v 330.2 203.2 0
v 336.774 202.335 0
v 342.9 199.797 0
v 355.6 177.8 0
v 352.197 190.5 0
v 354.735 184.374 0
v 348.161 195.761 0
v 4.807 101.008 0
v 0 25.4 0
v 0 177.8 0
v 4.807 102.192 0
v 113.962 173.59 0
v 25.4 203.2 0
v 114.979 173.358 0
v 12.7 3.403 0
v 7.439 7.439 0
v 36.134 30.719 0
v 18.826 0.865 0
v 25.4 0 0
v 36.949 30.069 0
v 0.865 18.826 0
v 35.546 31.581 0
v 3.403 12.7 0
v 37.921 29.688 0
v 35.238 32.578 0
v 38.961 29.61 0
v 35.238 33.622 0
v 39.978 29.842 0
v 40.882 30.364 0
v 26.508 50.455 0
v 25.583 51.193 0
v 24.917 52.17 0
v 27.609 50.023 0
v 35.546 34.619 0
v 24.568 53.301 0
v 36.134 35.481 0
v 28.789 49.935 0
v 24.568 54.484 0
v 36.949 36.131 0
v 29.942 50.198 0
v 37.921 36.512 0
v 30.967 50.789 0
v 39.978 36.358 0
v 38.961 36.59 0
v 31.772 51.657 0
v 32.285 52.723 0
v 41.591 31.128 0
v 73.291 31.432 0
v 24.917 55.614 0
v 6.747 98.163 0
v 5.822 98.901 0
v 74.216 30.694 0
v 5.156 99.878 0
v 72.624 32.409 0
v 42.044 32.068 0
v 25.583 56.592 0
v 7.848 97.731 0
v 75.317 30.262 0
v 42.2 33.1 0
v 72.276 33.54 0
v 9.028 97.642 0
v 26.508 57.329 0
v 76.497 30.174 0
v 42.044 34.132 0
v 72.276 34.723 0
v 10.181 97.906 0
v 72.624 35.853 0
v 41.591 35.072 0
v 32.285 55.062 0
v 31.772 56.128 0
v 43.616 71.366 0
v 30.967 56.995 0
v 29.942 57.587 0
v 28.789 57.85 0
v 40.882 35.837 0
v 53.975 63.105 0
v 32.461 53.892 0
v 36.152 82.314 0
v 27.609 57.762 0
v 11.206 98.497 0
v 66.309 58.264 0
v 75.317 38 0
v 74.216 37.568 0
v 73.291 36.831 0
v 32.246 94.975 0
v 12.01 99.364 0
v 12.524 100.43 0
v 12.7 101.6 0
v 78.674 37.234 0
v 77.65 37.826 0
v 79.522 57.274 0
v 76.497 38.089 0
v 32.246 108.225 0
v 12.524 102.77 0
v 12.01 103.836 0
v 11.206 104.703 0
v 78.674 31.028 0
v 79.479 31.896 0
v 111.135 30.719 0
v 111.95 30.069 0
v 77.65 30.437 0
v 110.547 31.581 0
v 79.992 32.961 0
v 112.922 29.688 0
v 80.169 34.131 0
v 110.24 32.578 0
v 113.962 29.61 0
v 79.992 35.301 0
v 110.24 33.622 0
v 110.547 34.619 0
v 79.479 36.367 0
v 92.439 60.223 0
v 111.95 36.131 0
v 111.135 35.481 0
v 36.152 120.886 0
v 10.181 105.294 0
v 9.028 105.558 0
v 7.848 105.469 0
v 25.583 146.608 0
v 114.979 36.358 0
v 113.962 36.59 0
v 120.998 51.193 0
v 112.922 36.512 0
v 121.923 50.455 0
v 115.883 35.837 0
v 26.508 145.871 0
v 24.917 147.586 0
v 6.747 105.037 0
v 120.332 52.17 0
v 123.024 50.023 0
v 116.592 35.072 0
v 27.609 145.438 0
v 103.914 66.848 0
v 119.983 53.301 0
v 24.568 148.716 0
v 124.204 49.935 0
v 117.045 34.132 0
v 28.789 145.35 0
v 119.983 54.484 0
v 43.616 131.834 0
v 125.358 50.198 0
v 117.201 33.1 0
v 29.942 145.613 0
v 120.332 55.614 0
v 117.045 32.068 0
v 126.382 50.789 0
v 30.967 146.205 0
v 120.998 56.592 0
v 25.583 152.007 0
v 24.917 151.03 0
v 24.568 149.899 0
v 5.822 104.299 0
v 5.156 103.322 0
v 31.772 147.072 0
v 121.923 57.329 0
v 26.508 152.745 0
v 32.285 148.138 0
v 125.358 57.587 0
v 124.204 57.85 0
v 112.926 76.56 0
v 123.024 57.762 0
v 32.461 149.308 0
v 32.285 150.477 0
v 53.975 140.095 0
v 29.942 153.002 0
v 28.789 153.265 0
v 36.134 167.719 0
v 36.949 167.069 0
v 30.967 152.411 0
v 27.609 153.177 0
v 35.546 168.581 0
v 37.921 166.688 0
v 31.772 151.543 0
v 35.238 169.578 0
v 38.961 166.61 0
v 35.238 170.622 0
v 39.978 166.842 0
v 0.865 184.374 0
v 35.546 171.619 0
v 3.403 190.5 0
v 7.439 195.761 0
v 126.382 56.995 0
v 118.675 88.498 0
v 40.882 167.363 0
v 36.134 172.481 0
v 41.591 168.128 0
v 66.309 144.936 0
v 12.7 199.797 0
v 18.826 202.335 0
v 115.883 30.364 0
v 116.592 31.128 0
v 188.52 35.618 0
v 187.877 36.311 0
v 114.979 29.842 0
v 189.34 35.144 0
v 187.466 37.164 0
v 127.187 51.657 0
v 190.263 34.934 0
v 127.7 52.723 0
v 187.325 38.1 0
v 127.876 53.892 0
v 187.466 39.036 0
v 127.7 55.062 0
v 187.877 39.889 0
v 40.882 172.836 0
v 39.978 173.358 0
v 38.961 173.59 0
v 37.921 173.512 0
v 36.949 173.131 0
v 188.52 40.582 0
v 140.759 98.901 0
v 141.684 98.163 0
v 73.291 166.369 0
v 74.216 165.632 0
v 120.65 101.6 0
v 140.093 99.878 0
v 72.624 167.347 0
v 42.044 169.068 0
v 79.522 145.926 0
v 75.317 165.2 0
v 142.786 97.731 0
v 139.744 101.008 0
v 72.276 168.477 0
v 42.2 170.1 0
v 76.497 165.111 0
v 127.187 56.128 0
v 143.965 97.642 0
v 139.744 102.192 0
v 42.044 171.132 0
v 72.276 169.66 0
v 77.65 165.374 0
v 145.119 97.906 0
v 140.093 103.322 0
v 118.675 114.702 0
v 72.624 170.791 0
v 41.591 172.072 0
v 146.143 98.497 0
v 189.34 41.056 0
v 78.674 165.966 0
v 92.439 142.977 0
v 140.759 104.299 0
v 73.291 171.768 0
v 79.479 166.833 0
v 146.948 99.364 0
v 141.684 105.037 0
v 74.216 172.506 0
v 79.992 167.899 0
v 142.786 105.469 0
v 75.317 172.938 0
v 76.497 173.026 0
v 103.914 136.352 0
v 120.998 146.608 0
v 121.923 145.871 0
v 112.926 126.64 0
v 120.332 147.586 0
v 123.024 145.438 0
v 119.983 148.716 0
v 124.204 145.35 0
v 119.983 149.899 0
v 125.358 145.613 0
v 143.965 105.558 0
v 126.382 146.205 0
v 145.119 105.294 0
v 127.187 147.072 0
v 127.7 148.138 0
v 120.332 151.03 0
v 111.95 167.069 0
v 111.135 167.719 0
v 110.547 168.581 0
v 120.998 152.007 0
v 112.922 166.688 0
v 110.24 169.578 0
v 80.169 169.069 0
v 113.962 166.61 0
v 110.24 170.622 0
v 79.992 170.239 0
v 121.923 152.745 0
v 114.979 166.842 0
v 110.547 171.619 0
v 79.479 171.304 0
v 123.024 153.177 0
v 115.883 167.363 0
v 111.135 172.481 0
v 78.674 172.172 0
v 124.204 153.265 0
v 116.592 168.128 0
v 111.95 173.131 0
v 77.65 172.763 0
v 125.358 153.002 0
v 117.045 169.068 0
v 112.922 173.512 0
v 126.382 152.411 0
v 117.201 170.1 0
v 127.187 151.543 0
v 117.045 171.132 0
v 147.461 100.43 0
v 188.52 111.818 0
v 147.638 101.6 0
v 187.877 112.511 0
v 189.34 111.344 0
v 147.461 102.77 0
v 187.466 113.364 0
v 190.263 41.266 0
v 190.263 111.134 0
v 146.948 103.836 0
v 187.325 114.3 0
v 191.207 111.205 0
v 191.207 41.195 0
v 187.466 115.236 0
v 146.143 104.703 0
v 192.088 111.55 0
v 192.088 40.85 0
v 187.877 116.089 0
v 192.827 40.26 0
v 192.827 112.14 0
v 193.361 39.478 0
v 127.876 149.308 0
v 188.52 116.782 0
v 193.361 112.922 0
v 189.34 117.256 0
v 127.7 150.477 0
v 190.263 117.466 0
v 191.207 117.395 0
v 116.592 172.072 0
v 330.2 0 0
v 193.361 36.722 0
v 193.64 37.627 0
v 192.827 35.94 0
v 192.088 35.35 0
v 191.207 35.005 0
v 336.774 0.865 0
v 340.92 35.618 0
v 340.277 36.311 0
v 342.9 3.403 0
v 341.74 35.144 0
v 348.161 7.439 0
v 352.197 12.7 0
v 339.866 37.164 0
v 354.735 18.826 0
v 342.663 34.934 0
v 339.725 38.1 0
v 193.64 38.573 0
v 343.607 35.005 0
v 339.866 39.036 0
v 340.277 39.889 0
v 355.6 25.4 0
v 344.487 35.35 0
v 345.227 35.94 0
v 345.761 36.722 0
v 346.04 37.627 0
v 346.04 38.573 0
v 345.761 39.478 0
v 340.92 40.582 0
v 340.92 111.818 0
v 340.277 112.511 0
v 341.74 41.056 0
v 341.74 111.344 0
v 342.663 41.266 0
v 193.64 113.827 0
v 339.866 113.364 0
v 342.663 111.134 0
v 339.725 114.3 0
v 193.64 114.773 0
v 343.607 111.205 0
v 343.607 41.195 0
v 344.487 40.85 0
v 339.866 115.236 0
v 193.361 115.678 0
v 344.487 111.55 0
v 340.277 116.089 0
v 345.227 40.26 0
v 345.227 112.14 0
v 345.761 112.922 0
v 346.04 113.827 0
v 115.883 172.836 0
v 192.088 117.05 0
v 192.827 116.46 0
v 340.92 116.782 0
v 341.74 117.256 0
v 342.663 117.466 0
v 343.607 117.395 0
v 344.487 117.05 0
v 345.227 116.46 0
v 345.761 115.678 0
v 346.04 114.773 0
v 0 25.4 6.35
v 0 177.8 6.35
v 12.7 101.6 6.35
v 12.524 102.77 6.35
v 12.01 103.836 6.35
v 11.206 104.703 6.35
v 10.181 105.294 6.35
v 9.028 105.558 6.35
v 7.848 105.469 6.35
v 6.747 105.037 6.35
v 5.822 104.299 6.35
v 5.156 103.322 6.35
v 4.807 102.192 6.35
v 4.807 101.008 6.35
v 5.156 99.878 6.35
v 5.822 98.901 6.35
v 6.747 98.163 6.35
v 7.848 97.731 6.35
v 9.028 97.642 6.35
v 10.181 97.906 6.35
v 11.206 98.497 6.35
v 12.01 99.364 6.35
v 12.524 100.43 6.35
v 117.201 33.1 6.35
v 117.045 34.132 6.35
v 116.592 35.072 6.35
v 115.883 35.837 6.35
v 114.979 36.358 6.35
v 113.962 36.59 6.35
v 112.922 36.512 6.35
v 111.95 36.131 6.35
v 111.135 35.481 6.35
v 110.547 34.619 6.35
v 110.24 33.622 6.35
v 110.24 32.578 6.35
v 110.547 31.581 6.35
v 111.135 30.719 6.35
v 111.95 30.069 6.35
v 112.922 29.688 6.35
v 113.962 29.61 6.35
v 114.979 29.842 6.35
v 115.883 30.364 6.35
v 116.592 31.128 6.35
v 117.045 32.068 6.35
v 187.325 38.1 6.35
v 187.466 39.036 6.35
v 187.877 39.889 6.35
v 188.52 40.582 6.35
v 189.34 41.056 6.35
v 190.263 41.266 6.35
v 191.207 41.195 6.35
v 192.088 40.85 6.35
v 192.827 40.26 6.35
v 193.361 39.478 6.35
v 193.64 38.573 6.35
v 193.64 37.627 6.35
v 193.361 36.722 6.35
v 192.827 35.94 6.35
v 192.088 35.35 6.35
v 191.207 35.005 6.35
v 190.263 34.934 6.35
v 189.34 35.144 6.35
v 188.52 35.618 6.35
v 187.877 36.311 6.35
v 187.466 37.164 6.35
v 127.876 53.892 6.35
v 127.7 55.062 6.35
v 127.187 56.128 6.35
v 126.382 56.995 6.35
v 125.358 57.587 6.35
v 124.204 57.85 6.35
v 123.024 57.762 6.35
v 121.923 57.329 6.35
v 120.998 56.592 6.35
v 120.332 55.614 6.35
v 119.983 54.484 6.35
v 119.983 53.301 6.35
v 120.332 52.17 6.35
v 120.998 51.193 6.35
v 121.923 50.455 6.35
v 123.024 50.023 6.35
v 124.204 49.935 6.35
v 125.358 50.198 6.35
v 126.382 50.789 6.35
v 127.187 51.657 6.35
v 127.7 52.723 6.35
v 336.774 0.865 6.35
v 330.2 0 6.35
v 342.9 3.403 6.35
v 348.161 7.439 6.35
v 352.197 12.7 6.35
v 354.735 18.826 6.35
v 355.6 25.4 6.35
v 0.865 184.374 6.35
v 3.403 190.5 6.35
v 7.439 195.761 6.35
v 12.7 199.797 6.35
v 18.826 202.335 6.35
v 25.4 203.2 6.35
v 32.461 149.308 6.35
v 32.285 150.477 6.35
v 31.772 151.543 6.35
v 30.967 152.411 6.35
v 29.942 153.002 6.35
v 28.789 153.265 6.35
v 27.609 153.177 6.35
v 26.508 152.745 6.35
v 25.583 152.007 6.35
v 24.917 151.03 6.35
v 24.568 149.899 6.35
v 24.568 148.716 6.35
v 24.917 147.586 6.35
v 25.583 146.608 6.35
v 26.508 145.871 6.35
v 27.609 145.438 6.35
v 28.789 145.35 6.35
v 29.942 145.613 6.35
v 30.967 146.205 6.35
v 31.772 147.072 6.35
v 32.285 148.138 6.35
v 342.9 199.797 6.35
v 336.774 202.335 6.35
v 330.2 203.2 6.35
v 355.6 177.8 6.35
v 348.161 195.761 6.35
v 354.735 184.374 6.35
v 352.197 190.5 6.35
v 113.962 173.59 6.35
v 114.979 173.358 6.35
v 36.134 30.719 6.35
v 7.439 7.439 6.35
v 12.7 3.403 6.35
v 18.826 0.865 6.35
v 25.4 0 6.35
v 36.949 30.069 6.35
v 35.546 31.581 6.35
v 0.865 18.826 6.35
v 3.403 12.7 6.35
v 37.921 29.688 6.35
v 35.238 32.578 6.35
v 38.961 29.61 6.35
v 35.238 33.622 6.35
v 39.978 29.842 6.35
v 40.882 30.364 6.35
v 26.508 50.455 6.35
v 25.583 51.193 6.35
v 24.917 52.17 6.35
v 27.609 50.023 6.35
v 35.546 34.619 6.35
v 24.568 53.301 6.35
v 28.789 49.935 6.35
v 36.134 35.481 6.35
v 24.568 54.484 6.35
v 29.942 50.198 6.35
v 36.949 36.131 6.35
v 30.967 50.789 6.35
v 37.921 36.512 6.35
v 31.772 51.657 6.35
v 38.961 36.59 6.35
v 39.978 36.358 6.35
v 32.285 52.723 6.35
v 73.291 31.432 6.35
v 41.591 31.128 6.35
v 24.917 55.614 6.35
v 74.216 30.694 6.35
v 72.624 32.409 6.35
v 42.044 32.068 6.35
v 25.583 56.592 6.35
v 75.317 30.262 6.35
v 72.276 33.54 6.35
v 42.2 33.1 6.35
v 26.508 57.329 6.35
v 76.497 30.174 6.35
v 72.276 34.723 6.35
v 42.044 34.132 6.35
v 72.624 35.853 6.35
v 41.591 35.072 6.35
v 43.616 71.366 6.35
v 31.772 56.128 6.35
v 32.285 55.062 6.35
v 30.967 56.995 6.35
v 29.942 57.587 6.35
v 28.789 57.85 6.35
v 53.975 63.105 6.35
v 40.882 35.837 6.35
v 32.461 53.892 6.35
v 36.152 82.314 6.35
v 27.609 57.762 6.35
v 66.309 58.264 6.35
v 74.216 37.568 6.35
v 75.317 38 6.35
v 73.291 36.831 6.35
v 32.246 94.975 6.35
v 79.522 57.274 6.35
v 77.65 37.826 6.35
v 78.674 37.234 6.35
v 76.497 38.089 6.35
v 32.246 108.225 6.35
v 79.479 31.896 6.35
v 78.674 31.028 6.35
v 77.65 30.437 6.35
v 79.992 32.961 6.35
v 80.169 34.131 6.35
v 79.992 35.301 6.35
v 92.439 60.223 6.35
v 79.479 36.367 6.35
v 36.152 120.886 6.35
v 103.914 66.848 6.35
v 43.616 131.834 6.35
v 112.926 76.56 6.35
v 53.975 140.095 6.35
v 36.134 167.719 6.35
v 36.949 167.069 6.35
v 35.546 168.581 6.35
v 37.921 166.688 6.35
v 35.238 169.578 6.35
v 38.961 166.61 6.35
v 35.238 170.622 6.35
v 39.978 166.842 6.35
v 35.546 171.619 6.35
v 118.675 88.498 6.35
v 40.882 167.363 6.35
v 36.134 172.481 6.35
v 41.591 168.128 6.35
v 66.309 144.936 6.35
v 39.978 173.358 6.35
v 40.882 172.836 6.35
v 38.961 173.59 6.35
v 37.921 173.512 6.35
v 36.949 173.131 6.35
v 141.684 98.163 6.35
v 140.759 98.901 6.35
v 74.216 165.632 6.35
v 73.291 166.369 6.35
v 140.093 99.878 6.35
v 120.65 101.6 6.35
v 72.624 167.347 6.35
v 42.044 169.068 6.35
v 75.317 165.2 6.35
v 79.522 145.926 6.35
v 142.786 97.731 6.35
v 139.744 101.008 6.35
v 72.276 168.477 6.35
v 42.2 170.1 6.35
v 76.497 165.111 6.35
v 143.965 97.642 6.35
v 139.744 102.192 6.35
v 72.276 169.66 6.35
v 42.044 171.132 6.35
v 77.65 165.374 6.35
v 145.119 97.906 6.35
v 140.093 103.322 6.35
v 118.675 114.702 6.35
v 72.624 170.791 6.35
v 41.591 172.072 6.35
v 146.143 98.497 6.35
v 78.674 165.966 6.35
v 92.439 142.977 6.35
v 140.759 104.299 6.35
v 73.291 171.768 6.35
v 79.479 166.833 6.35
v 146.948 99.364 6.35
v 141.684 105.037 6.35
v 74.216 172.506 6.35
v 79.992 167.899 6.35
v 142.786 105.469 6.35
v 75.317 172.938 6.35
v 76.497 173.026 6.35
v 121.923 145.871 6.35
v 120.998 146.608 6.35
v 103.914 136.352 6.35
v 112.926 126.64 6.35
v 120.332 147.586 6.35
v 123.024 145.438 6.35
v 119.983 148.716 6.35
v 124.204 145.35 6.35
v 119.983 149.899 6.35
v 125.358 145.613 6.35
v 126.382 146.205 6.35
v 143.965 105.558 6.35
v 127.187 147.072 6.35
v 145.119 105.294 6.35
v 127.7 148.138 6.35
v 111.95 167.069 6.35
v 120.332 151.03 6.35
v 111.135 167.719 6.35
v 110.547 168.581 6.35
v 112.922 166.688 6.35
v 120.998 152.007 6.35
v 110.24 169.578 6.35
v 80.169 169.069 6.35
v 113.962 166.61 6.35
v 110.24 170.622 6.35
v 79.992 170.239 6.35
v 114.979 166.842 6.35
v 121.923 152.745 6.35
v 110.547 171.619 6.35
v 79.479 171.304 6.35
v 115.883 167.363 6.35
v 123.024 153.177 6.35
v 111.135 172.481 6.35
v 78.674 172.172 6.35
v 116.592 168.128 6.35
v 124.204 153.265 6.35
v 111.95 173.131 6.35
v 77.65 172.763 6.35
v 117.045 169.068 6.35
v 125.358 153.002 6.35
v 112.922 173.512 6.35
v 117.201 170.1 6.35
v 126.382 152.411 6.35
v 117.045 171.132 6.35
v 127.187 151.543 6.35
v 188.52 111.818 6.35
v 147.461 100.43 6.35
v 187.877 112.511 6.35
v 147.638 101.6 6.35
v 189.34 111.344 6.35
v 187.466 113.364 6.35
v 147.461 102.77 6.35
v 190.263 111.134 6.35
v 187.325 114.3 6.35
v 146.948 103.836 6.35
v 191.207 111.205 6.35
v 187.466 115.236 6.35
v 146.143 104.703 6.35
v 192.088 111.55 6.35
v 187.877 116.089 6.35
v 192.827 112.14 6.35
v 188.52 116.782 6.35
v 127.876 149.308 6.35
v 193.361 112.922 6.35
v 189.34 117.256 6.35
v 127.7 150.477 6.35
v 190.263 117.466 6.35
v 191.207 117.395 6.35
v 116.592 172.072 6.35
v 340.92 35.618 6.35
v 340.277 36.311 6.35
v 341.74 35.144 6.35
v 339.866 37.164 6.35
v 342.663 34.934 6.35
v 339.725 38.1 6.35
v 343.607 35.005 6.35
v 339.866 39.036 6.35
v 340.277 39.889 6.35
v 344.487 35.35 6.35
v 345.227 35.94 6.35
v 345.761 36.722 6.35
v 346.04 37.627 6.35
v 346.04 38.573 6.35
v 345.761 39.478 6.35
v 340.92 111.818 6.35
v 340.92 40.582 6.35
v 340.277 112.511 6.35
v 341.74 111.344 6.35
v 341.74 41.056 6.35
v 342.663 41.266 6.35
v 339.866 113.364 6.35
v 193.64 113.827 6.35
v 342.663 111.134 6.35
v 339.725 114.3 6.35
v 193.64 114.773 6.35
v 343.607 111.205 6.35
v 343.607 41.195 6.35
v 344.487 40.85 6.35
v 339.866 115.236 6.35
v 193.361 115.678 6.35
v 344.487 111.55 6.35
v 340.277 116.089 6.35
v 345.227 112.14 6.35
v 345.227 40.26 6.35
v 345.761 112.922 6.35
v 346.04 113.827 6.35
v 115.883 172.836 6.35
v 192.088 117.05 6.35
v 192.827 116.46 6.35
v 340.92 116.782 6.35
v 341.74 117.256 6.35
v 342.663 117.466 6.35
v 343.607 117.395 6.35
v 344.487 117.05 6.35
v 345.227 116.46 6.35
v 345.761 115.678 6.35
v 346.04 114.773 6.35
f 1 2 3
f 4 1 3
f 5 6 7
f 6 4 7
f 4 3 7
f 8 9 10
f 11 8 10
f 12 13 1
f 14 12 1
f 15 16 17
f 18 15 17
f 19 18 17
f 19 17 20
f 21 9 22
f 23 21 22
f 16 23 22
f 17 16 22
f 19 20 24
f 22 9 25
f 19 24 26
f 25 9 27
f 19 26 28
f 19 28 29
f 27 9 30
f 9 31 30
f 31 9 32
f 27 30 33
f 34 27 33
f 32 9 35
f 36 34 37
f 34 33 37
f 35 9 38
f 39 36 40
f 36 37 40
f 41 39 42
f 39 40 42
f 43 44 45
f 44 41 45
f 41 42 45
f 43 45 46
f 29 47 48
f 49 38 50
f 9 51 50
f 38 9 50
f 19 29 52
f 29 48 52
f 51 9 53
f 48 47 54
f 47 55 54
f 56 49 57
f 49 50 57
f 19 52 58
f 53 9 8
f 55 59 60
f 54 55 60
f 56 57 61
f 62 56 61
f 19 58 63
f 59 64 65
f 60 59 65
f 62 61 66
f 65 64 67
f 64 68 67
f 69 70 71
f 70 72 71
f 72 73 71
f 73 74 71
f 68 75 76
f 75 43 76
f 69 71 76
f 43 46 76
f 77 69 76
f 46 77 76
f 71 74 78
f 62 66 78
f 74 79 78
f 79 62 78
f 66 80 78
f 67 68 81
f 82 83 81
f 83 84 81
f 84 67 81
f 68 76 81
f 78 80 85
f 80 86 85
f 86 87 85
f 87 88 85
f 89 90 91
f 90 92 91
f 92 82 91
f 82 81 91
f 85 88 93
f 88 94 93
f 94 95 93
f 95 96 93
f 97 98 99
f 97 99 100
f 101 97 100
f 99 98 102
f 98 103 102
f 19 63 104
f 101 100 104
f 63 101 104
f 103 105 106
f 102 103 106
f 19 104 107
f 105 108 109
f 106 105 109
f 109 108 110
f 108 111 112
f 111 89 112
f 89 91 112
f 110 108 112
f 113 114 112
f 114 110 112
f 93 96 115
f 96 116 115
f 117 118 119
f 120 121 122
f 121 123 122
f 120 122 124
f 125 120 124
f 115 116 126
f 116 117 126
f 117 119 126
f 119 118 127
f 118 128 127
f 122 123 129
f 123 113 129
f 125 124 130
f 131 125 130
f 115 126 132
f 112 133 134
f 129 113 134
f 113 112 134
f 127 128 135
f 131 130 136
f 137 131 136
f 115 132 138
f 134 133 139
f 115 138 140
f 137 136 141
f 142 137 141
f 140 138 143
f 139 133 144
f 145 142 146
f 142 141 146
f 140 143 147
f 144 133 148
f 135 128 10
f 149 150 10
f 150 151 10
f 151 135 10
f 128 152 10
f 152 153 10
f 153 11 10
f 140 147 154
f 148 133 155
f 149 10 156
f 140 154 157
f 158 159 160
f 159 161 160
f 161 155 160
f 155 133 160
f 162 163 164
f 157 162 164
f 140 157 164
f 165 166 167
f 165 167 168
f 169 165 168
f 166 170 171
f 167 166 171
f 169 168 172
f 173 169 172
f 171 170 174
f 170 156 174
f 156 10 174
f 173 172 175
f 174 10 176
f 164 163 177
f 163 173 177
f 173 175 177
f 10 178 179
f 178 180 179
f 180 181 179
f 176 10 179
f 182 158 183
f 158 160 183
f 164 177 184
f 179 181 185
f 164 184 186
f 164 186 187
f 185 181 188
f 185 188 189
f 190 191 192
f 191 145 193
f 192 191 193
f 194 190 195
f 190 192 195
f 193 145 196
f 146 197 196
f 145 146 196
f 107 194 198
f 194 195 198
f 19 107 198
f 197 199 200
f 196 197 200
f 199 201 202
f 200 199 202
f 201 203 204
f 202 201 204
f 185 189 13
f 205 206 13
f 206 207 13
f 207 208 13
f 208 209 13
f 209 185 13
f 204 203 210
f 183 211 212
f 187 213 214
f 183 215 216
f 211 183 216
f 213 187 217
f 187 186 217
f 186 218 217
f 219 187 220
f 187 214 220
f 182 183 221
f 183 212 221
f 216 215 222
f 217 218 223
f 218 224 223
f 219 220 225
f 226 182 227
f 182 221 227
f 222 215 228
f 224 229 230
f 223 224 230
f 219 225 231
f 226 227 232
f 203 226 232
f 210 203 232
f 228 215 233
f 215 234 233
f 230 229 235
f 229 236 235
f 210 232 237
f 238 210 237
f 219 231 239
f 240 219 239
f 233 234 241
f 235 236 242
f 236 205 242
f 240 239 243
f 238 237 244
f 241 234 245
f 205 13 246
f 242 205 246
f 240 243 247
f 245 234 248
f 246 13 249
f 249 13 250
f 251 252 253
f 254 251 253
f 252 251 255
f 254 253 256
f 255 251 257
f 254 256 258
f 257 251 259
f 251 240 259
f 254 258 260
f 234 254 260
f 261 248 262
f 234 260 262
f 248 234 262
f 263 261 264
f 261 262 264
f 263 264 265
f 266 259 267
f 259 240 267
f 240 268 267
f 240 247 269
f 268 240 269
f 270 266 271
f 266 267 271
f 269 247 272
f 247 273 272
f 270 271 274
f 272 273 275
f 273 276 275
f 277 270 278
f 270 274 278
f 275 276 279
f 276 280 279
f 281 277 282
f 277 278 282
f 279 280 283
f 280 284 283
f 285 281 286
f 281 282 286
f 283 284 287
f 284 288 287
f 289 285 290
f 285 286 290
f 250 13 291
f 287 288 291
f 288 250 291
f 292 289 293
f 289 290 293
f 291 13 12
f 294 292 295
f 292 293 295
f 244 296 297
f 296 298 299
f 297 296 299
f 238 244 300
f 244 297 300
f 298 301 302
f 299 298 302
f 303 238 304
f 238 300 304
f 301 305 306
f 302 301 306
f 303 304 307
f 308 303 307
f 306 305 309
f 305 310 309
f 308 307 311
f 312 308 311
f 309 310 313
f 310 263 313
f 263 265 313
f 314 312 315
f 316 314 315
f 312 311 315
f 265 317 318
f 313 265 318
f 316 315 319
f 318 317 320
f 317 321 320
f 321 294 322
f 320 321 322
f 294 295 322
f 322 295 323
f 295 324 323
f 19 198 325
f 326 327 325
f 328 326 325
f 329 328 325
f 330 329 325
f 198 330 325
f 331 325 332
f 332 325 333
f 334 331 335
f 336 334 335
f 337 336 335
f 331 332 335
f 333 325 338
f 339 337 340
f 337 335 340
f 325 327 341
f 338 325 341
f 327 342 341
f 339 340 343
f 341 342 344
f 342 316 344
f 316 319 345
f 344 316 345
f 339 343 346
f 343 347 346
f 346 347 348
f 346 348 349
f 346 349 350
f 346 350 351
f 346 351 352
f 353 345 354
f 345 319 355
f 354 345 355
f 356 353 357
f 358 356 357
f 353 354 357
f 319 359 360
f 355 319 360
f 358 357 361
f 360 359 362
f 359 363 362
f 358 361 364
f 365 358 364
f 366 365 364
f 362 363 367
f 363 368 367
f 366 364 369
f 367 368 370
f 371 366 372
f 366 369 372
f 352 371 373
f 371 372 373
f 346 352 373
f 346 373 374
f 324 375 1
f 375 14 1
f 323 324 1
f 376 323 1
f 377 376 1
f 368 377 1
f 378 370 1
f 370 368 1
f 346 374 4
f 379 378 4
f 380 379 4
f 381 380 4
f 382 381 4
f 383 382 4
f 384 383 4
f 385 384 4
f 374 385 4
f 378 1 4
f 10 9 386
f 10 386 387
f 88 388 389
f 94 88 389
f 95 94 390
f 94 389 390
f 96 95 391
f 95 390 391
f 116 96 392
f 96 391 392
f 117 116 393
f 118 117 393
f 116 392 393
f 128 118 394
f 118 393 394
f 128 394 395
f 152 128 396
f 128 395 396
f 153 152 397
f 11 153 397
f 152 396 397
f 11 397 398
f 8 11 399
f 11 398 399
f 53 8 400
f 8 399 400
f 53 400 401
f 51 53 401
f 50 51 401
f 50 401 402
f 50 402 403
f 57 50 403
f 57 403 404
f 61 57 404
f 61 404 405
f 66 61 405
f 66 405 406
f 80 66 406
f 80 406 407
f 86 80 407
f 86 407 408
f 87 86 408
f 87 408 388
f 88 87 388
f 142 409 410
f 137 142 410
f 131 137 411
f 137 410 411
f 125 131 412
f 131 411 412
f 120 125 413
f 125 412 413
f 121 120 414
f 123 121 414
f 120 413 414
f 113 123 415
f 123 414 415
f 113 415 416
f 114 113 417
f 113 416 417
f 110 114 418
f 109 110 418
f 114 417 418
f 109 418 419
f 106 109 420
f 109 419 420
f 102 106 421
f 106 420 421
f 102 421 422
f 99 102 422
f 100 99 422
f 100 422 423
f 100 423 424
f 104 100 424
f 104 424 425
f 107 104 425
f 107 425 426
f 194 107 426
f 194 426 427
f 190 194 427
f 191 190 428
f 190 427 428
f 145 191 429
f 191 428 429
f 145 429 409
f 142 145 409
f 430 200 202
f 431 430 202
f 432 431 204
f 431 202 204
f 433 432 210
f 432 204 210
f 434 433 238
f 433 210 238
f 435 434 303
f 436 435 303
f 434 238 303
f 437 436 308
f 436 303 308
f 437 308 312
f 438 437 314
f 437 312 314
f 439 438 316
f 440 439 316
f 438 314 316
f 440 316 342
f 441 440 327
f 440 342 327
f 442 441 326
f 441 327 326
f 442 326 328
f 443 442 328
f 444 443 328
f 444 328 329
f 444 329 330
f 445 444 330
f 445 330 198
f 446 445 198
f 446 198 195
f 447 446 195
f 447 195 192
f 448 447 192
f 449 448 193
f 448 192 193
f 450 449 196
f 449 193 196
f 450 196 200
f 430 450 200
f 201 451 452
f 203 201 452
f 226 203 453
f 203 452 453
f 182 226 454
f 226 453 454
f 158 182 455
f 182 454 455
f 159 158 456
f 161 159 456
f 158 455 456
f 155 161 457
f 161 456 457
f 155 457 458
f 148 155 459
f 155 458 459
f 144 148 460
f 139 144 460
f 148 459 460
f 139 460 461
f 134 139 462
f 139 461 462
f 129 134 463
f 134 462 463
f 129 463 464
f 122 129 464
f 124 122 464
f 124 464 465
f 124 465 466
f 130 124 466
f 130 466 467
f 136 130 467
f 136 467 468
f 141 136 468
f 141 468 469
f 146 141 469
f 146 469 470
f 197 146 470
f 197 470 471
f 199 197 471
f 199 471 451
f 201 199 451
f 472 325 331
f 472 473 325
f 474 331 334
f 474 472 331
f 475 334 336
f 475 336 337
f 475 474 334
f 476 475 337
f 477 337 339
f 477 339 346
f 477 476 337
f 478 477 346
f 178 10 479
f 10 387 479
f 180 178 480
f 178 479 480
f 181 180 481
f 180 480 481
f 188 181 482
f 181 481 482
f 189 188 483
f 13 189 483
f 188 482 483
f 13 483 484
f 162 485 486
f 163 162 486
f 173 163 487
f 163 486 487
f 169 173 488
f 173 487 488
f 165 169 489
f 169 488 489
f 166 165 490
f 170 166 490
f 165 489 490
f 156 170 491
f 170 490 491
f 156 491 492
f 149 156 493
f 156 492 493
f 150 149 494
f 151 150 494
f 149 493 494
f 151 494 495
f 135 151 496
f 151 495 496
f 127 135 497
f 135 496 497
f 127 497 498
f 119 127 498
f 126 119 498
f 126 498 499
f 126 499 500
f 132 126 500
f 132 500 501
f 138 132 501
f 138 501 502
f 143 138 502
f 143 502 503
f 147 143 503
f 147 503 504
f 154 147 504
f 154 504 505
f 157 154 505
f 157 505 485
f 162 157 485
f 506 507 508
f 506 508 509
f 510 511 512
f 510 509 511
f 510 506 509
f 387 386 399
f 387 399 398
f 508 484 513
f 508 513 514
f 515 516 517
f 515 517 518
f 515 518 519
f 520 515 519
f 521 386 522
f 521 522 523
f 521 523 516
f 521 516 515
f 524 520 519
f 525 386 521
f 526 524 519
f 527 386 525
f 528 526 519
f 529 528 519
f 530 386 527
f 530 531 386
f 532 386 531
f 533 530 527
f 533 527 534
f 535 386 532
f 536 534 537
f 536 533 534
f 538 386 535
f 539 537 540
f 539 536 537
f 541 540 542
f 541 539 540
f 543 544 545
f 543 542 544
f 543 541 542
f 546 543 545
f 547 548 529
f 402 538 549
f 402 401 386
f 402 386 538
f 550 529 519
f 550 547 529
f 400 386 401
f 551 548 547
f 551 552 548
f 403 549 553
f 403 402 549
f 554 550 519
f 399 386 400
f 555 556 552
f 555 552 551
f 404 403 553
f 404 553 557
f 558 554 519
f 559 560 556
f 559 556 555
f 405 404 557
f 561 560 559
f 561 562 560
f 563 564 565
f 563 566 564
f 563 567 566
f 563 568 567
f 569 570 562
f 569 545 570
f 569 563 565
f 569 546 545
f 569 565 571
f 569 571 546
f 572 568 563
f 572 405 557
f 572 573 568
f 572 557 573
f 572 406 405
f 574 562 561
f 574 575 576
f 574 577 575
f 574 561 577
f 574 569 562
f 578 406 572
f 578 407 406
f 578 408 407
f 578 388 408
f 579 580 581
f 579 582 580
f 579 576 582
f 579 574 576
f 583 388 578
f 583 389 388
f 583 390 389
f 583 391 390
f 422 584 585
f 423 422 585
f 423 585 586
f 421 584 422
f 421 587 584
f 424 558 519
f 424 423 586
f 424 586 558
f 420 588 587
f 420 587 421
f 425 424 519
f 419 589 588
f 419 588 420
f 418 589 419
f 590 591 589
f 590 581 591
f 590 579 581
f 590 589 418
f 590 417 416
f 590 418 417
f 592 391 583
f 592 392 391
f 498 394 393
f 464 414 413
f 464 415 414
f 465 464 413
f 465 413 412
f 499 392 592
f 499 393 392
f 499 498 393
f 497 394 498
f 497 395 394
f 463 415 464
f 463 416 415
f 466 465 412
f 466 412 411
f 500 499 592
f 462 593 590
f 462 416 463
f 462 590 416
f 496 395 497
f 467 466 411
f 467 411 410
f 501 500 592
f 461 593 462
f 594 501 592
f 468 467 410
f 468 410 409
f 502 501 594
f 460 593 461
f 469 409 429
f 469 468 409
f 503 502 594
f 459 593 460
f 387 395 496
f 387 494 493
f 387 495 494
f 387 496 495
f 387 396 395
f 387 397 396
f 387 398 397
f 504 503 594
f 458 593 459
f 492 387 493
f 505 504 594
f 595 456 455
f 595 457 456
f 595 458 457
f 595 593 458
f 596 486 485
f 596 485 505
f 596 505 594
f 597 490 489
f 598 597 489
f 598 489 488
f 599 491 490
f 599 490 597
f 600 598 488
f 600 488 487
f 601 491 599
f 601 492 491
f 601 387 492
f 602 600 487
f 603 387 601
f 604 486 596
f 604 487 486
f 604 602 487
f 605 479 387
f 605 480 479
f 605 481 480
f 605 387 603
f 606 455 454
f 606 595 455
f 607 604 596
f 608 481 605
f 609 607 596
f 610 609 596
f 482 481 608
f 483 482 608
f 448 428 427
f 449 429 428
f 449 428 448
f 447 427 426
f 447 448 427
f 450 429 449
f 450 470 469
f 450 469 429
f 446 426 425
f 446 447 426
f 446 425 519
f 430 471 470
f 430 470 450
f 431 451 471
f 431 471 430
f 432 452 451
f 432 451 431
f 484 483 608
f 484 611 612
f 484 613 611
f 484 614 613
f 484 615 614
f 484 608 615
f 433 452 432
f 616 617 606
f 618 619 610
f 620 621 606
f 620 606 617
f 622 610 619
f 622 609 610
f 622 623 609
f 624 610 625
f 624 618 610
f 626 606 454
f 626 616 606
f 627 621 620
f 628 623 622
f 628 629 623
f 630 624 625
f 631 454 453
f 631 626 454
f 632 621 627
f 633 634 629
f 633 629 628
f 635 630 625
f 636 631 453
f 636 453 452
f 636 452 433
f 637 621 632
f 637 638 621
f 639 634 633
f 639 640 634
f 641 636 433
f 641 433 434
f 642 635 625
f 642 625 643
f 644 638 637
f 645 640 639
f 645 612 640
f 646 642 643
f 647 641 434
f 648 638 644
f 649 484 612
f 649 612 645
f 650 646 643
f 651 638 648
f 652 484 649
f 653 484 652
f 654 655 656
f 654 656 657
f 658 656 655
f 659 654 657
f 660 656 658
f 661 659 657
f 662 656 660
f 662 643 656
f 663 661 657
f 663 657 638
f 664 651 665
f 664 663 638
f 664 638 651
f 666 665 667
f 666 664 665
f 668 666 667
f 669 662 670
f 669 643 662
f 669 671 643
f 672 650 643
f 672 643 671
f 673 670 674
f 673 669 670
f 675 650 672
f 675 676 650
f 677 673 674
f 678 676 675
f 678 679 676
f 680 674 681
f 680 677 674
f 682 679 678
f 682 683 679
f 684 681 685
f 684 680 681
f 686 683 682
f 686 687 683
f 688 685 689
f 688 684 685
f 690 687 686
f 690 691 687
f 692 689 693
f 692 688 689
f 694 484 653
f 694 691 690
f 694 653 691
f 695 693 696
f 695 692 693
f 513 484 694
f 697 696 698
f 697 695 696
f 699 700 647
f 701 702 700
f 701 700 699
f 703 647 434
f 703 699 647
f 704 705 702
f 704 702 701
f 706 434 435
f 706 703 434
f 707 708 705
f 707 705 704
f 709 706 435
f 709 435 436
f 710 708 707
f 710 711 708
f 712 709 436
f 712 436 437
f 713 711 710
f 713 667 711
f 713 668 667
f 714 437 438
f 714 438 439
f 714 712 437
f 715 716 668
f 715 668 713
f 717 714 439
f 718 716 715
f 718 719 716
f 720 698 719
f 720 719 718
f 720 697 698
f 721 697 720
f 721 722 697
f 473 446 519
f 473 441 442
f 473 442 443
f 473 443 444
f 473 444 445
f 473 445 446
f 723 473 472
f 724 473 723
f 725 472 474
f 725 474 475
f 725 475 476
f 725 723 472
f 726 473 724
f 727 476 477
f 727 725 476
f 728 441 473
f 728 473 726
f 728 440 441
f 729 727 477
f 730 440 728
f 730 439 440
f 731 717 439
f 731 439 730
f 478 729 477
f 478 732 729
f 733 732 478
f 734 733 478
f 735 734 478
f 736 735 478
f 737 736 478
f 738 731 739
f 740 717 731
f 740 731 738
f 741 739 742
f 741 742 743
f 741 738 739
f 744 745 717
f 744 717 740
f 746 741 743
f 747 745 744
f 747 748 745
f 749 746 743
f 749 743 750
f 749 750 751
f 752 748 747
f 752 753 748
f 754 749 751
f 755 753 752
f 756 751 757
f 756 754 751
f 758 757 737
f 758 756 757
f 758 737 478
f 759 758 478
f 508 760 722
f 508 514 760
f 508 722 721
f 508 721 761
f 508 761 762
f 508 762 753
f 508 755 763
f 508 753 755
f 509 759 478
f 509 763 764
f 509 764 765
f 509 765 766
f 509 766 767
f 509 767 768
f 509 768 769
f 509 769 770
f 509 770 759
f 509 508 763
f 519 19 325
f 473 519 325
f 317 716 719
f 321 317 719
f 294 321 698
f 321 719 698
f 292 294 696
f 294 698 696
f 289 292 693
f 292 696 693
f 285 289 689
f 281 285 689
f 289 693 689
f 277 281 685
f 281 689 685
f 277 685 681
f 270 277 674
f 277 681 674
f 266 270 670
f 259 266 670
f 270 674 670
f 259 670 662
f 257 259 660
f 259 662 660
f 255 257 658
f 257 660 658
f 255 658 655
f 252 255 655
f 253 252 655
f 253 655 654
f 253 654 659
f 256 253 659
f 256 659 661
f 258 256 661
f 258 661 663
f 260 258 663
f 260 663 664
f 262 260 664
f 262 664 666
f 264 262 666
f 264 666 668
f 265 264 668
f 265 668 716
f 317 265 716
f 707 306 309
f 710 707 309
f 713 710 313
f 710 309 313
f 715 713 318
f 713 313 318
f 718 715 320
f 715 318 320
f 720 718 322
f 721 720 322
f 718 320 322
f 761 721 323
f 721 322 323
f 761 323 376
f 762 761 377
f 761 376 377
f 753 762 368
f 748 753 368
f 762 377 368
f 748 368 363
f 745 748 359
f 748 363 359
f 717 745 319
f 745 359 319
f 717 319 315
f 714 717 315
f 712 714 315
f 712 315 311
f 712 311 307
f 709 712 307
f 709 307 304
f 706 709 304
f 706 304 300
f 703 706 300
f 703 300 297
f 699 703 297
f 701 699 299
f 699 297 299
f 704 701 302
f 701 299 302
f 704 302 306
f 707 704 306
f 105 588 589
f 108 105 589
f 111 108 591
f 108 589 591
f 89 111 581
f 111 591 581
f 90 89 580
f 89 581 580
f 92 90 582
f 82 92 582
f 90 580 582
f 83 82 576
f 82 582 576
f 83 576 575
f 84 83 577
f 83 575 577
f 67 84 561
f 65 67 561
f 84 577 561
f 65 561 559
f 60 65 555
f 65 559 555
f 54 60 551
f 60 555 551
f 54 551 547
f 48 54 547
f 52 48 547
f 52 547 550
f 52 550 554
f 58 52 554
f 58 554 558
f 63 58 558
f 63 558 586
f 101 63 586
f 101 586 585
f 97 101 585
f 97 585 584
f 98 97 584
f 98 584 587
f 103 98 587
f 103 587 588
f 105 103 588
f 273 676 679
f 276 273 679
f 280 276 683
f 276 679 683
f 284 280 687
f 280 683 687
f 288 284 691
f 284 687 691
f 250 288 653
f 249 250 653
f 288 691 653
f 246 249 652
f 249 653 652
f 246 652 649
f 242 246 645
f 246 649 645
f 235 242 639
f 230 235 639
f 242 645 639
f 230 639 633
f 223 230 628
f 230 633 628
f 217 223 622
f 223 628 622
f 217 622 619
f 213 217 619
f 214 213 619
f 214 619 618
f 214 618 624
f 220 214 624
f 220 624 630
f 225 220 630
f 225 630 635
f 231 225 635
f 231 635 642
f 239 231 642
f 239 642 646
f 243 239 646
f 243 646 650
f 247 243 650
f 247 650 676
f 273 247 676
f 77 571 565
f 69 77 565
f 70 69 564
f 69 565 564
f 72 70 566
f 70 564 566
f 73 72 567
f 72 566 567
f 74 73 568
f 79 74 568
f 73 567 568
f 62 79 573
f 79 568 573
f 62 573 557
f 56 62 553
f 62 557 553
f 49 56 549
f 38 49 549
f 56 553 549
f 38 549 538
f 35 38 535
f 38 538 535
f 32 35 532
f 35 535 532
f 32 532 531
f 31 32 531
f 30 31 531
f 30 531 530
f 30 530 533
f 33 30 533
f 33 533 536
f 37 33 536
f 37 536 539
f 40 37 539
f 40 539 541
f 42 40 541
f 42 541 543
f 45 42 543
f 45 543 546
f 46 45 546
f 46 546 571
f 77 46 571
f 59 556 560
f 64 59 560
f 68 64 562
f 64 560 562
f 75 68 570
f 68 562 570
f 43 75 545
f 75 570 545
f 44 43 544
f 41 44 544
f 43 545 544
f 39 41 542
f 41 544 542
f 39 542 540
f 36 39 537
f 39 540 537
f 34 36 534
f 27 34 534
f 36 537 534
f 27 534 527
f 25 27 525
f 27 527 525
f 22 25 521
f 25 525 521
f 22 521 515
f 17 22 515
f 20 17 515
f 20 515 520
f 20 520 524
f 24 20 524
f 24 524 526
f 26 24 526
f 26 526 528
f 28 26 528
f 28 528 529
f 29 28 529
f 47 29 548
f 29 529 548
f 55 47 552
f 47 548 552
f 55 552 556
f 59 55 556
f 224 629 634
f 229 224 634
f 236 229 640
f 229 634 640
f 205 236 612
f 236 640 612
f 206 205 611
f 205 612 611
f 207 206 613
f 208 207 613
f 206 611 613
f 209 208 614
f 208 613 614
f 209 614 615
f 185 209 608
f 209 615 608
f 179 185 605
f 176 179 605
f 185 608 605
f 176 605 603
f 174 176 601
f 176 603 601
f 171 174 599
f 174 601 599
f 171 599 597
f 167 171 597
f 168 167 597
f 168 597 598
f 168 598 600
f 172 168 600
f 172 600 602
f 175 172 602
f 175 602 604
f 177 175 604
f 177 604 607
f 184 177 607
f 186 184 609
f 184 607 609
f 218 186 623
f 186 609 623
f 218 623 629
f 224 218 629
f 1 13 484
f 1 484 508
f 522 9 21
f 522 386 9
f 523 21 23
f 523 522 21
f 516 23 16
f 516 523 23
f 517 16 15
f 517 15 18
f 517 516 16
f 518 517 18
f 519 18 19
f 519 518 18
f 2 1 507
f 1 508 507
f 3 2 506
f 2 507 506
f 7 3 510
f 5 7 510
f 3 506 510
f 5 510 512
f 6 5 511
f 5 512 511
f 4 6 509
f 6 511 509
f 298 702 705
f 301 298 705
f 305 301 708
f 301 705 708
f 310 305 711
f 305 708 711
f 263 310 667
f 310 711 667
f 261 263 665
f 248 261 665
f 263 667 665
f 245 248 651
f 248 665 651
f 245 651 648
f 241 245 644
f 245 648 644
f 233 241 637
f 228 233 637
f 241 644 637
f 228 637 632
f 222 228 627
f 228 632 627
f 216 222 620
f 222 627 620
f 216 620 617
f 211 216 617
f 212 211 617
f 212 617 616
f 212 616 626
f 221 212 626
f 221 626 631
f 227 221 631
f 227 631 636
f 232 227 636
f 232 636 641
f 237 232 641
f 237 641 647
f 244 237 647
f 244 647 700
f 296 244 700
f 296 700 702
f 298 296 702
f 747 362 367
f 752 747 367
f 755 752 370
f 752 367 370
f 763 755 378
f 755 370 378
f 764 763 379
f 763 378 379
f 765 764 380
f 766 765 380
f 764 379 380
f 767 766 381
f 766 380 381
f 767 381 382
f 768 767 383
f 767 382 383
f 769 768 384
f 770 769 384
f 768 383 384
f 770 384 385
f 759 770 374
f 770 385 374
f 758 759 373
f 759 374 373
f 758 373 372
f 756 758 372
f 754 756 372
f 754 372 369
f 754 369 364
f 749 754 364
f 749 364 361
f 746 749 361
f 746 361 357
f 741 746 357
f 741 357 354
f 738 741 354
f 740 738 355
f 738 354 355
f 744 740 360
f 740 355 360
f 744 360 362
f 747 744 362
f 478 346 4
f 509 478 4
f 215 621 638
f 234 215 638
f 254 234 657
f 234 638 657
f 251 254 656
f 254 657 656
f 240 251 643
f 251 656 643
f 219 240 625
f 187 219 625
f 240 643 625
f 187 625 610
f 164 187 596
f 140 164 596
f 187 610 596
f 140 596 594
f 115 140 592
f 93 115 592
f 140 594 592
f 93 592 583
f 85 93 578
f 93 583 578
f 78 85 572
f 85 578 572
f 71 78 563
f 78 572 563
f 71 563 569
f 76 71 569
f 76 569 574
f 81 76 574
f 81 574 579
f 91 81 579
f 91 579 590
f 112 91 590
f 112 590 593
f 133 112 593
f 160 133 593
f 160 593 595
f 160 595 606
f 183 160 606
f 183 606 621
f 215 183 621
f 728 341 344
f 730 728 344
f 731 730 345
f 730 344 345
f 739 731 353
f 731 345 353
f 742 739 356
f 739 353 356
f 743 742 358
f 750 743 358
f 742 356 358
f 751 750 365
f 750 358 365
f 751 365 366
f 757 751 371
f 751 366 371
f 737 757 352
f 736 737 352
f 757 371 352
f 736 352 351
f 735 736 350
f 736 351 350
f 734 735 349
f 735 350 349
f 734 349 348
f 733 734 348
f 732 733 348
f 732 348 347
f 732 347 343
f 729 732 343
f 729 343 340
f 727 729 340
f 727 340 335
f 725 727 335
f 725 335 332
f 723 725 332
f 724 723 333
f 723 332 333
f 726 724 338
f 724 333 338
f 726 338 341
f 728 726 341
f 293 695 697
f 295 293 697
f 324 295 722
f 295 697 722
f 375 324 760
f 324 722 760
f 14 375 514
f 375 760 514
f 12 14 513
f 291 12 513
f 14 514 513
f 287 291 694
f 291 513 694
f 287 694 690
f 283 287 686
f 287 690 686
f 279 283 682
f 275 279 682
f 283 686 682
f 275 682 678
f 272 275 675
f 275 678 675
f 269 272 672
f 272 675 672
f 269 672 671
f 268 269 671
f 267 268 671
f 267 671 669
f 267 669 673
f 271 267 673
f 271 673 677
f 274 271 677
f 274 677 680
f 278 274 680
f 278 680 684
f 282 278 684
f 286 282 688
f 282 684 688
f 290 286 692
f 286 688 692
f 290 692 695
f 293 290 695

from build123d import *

# Parameters (mm, degrees)
SKETCH1_W           = 355.6
SKETCH1_H           = 203.2
BOSS_EXTRUDE1_DEPTH = 6.35
SKETCH2_R           = 44.45
SKETCH2_R_2         = 3.96875
CUT_EXTRUDE1_DEPTH  = 76.2
SKETCH3_R           = 3.50012
CUT_EXTRUDE2_DEPTH  = 6.35
FILLET1_R           = 25.4
SKETCH5_R           = 3.175
CUT_EXTRUDE4_DEPTH  = 6.35


with BuildPart() as part:
    # Sketch1 → Boss-Extrude1 (new body)
    with BuildSketch(Plane.XY):
        with Locations((177.8, 101.6)):
            Rectangle(SKETCH1_W, SKETCH1_H)
    extrude(amount=BOSS_EXTRUDE1_DEPTH)

    # Sketch2 → Cut-Extrude1 (cut)
    with BuildSketch(Plane.XY.offset(6.35)):
        with Locations((76.2, 101.6)):
            Circle(SKETCH2_R)
        with Locations((143.66875, 101.6)):
            Circle(SKETCH2_R_2)
        with Locations((123.907610643, 53.892389357)):
            Circle(SKETCH2_R_2)
        with Locations((76.2, 34.13125)):
            Circle(SKETCH2_R_2)
        with Locations((28.492389357, 53.892389357)):
            Circle(SKETCH2_R_2)
        with Locations((8.73125, 101.6)):
            Circle(SKETCH2_R_2)
        with Locations((28.492389357, 149.307610643)):
            Circle(SKETCH2_R_2)
        with Locations((76.2, 169.06875)):
            Circle(SKETCH2_R_2)
        with Locations((123.907610643, 149.307610643)):
            Circle(SKETCH2_R_2)
    extrude(amount=-CUT_EXTRUDE1_DEPTH, mode=Mode.SUBTRACT)

    # Sketch3 → Cut-Extrude2 (cut)
    with BuildSketch(Plane.XY.offset(6.35)):
        with Locations((38.69944, 170.09999)):
            Circle(SKETCH3_R)
        with Locations((113.70056, 170.09999)):
            Circle(SKETCH3_R)
        with Locations((113.70056, 33.10001)):
            Circle(SKETCH3_R)
        with Locations((38.69944, 33.10001)):
            Circle(SKETCH3_R)
    extrude(amount=-CUT_EXTRUDE2_DEPTH, mode=Mode.SUBTRACT)

    # Fillet1
    fillet1_edges = [part.edges().sort_by_distance(p)[0] for p in [
        (0, 203.2, 3.175),
        (355.6, 203.2, 3.175),
        (355.6, 0, 3.175),
        (0, 0, 3.175),
    ]]
    fillet(fillet1_edges, radius=FILLET1_R)

    # Sketch5 → Cut-Extrude4 (cut)
    with BuildSketch(Plane(origin=(0, 0, 0), x_dir=(-1, 0, 0), z_dir=(0, 0, -1))):
        with Locations((-342.9, 114.3)):
            Circle(SKETCH5_R)
        with Locations((-190.5, 114.3)):
            Circle(SKETCH5_R)
        with Locations((-190.5, 38.1)):
            Circle(SKETCH5_R)
        with Locations((-342.9, 38.1)):
            Circle(SKETCH5_R)
    extrude(amount=-CUT_EXTRUDE4_DEPTH, mode=Mode.SUBTRACT)


solid = part.part
